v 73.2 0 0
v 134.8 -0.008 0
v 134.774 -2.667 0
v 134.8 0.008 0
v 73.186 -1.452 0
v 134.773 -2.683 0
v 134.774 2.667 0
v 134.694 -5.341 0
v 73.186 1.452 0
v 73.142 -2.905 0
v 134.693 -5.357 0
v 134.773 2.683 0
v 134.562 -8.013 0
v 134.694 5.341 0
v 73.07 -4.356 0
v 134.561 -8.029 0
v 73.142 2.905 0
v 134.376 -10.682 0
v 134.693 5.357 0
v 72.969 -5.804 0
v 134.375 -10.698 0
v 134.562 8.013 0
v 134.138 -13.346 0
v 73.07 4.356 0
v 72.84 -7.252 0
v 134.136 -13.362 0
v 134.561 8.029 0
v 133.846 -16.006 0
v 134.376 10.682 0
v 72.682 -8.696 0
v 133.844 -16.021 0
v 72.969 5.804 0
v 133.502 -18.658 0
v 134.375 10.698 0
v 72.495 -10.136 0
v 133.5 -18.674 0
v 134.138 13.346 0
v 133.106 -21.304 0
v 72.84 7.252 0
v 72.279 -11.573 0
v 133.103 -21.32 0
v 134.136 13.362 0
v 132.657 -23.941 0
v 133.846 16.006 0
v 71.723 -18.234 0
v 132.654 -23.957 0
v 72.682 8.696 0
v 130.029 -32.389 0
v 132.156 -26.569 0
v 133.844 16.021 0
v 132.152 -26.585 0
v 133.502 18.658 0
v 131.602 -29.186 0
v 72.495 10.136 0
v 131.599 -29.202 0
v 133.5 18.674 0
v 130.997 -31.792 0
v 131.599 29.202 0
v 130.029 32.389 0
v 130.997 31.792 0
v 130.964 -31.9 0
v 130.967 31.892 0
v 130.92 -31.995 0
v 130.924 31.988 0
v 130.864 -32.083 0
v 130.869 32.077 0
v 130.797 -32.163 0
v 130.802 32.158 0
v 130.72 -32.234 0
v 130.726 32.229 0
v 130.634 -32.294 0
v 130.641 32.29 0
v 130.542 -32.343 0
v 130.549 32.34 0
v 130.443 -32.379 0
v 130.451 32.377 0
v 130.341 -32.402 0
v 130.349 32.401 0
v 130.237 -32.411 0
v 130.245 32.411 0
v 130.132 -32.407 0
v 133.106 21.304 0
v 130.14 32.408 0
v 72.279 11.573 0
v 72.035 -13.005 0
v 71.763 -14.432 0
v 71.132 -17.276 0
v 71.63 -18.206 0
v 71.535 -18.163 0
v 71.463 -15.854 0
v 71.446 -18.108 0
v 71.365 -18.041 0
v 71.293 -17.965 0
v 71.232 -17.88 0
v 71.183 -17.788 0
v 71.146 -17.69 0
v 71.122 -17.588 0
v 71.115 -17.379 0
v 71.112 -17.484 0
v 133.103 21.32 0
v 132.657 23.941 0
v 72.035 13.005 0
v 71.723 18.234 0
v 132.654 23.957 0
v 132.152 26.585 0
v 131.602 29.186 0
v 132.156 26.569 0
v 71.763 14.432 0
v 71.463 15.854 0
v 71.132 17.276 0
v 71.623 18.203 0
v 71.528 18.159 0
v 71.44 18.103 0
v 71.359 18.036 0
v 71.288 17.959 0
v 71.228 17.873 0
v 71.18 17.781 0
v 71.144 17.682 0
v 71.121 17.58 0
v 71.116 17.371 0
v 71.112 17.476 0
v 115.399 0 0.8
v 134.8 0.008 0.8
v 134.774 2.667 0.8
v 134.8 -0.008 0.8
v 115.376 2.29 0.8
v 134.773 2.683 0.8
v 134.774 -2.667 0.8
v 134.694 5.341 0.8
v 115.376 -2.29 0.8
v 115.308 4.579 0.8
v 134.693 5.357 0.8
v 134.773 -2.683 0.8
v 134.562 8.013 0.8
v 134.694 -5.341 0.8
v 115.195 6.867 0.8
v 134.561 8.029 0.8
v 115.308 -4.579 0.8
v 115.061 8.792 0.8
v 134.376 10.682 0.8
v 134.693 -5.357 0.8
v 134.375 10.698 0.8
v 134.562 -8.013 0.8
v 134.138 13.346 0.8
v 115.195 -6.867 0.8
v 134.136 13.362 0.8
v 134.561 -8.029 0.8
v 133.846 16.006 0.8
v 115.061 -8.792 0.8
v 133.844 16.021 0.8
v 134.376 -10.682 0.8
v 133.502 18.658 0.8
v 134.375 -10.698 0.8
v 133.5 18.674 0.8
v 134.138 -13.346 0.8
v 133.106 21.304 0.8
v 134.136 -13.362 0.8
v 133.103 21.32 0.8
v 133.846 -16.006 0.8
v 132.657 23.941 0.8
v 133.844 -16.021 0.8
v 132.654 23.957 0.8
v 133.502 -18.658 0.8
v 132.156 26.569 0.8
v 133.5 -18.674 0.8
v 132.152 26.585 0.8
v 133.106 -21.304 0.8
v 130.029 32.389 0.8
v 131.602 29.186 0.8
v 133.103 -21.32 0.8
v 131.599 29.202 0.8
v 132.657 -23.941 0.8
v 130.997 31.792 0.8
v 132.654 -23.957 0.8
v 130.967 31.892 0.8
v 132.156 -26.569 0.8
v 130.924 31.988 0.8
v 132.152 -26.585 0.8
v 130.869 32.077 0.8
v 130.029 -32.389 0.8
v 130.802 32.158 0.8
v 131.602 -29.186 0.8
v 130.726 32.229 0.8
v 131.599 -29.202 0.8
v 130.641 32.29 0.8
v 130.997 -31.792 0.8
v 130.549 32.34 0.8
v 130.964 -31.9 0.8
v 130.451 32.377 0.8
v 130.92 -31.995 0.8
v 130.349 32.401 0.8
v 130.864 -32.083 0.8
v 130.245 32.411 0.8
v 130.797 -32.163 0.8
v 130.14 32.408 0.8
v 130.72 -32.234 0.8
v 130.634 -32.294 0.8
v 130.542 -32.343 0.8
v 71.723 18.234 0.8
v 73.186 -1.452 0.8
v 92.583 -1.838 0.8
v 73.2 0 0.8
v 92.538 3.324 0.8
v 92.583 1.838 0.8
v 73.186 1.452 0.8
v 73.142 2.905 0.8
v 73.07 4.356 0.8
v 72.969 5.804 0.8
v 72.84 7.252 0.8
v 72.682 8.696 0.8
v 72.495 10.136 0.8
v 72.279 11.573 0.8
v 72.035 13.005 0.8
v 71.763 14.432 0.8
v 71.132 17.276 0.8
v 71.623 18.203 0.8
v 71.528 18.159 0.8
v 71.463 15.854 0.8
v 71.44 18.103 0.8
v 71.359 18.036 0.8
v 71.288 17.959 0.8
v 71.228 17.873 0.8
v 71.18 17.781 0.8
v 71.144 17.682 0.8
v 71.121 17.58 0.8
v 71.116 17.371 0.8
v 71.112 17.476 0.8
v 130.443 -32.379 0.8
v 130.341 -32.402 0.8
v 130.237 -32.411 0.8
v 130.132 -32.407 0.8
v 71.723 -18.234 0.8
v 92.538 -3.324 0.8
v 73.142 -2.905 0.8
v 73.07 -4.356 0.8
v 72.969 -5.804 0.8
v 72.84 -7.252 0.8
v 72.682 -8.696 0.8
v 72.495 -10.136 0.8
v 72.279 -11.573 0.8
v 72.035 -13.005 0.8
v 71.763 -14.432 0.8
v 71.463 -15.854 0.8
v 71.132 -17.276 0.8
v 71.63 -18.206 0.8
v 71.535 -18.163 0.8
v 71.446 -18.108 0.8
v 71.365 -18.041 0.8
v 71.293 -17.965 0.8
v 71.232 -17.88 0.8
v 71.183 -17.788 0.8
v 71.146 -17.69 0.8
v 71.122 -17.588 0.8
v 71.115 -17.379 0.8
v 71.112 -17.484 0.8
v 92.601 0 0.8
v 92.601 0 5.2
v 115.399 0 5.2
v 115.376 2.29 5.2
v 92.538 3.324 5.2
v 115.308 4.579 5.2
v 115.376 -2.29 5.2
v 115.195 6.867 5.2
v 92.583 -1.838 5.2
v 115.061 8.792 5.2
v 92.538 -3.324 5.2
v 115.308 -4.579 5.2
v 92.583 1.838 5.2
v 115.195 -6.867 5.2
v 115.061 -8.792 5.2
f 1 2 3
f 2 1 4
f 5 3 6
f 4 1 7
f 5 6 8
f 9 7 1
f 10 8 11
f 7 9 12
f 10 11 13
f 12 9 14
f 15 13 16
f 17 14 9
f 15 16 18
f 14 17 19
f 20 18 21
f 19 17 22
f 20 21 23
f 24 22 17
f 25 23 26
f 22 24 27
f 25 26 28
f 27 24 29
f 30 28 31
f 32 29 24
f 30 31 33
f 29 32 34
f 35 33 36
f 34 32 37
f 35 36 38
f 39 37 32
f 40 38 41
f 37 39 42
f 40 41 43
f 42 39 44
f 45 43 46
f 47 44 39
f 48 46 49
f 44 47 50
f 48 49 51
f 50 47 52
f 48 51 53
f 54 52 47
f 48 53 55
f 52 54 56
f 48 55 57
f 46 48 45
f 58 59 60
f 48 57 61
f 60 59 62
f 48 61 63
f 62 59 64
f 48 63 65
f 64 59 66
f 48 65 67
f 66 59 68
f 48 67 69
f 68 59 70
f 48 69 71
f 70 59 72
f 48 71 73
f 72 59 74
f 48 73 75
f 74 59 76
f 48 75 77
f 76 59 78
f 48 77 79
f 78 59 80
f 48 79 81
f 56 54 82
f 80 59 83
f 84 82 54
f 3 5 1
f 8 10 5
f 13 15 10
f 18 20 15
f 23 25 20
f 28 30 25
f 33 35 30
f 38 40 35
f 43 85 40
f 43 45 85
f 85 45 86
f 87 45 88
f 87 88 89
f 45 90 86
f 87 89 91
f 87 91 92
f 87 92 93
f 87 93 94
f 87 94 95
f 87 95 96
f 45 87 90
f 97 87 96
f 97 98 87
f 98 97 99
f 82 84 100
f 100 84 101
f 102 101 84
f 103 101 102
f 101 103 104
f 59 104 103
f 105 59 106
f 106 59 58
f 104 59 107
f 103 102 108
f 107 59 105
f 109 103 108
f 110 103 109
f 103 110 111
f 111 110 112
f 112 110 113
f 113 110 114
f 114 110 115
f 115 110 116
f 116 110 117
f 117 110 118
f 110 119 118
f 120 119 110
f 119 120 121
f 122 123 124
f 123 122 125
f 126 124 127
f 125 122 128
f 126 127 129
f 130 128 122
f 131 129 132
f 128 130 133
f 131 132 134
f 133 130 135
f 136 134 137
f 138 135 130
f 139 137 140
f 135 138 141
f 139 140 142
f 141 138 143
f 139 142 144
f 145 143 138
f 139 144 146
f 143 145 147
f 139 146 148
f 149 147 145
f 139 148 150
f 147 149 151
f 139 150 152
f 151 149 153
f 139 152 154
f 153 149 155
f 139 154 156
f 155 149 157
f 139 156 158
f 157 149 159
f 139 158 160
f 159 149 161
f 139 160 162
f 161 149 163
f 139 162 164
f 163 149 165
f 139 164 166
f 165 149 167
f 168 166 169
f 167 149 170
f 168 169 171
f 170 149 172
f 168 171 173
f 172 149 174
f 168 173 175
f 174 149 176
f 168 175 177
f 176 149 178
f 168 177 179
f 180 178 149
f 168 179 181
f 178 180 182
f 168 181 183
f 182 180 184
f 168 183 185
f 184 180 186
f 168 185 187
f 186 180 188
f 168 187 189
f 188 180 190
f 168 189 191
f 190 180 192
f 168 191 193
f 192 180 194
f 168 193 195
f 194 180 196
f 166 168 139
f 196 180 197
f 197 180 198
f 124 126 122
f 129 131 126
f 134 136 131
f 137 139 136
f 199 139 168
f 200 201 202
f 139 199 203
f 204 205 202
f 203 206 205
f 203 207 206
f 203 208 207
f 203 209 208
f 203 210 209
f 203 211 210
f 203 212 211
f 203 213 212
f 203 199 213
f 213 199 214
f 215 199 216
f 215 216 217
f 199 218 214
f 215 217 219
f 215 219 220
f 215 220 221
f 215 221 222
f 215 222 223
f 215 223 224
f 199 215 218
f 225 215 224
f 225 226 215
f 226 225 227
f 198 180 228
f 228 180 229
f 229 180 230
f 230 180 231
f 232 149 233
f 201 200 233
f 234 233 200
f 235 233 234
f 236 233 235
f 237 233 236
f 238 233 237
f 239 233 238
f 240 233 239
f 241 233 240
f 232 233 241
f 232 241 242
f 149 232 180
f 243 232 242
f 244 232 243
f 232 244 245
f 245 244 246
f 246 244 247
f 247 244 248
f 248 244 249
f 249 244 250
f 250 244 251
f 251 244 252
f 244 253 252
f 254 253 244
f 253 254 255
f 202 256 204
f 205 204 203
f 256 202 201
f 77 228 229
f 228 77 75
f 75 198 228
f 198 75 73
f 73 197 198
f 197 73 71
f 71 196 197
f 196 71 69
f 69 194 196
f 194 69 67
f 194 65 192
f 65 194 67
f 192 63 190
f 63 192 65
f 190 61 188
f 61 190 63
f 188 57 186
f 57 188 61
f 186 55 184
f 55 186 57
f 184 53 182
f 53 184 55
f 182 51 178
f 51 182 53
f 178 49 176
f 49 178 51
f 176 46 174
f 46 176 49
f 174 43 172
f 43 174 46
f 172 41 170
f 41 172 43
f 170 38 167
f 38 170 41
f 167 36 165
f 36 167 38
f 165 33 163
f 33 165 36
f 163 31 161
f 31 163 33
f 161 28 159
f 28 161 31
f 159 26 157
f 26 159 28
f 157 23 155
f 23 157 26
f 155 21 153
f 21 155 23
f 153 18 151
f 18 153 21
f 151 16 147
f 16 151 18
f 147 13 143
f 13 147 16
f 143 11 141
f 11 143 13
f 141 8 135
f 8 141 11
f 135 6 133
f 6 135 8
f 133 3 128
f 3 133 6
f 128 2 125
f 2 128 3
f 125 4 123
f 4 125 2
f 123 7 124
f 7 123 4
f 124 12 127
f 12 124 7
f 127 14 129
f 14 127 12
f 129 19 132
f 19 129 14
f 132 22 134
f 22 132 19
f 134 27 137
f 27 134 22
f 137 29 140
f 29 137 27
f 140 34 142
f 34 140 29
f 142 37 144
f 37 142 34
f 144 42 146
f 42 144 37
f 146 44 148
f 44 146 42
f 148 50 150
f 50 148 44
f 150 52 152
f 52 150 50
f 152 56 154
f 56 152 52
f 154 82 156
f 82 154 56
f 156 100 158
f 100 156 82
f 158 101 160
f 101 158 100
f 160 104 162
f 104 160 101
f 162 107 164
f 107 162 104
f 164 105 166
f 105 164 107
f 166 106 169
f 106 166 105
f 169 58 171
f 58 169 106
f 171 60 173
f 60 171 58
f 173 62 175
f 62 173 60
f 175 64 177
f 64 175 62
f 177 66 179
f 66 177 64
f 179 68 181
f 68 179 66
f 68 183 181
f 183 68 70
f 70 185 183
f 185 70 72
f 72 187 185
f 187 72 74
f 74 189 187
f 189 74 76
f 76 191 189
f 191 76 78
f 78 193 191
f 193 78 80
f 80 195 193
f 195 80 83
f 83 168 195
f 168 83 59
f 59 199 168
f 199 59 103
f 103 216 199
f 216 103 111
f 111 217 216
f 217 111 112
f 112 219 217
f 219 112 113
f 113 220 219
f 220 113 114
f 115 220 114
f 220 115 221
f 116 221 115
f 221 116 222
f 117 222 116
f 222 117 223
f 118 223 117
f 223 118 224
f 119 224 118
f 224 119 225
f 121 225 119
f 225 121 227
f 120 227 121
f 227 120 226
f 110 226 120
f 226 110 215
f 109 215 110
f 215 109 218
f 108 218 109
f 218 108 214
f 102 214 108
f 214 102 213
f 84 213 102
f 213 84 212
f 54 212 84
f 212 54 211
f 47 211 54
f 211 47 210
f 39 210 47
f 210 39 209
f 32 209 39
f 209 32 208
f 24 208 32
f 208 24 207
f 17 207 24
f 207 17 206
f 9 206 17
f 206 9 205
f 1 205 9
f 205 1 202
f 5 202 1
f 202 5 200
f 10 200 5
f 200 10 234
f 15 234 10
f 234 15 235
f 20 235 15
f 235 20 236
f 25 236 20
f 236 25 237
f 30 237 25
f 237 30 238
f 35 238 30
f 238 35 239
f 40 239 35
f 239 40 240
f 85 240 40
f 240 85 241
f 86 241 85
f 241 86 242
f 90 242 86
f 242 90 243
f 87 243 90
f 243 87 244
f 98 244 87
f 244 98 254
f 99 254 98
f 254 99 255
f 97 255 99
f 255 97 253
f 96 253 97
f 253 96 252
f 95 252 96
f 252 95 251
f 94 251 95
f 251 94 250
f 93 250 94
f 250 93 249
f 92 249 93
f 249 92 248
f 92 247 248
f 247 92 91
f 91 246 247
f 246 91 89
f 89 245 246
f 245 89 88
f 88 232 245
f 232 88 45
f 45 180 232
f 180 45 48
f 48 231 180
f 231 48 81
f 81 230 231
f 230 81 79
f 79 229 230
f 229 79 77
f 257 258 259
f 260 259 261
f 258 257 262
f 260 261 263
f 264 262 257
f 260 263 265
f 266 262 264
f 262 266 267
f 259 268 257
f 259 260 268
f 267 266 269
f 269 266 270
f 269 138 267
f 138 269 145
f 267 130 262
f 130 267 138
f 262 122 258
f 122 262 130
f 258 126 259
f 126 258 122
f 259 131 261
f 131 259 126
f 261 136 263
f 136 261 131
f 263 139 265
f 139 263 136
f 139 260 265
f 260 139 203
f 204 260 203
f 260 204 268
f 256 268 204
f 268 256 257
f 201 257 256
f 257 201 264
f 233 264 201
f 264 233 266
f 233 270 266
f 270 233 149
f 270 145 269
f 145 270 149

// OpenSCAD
// Gen-DM — bobbin BASE (bottom flange + hub). Print x12, flange down. Wind 24 AWG x 223 t around
// the hub with the LID glued on (coil_lid.stl). Copper lives ONLY between the flanges (no proud winds).
include <parameters.scad>;
$fn = 48;
module sector_2d(r_in, r_out, ang) {
    polygon([
        for (a = [-ang/2 : ang/24 : ang/2]) [r_in*cos(a), r_in*sin(a)],
        for (a = [ang/2 : -ang/24 : -ang/2]) [r_out*cos(a), r_out*sin(a)]
    ]);
}
module footprint_2d() { offset(r=wall) sector_2d(coil_id_r, coil_od_r, span_deg); }
module hub_2d()       { offset(delta=-coil_core_inset) sector_2d(coil_id_r, coil_od_r, span_deg); }

union() {
    linear_extrude(flange_t) footprint_2d();
    translate([0, 0, flange_t - 0.01]) linear_extrude(former_web + 0.01) hub_2d();
}
